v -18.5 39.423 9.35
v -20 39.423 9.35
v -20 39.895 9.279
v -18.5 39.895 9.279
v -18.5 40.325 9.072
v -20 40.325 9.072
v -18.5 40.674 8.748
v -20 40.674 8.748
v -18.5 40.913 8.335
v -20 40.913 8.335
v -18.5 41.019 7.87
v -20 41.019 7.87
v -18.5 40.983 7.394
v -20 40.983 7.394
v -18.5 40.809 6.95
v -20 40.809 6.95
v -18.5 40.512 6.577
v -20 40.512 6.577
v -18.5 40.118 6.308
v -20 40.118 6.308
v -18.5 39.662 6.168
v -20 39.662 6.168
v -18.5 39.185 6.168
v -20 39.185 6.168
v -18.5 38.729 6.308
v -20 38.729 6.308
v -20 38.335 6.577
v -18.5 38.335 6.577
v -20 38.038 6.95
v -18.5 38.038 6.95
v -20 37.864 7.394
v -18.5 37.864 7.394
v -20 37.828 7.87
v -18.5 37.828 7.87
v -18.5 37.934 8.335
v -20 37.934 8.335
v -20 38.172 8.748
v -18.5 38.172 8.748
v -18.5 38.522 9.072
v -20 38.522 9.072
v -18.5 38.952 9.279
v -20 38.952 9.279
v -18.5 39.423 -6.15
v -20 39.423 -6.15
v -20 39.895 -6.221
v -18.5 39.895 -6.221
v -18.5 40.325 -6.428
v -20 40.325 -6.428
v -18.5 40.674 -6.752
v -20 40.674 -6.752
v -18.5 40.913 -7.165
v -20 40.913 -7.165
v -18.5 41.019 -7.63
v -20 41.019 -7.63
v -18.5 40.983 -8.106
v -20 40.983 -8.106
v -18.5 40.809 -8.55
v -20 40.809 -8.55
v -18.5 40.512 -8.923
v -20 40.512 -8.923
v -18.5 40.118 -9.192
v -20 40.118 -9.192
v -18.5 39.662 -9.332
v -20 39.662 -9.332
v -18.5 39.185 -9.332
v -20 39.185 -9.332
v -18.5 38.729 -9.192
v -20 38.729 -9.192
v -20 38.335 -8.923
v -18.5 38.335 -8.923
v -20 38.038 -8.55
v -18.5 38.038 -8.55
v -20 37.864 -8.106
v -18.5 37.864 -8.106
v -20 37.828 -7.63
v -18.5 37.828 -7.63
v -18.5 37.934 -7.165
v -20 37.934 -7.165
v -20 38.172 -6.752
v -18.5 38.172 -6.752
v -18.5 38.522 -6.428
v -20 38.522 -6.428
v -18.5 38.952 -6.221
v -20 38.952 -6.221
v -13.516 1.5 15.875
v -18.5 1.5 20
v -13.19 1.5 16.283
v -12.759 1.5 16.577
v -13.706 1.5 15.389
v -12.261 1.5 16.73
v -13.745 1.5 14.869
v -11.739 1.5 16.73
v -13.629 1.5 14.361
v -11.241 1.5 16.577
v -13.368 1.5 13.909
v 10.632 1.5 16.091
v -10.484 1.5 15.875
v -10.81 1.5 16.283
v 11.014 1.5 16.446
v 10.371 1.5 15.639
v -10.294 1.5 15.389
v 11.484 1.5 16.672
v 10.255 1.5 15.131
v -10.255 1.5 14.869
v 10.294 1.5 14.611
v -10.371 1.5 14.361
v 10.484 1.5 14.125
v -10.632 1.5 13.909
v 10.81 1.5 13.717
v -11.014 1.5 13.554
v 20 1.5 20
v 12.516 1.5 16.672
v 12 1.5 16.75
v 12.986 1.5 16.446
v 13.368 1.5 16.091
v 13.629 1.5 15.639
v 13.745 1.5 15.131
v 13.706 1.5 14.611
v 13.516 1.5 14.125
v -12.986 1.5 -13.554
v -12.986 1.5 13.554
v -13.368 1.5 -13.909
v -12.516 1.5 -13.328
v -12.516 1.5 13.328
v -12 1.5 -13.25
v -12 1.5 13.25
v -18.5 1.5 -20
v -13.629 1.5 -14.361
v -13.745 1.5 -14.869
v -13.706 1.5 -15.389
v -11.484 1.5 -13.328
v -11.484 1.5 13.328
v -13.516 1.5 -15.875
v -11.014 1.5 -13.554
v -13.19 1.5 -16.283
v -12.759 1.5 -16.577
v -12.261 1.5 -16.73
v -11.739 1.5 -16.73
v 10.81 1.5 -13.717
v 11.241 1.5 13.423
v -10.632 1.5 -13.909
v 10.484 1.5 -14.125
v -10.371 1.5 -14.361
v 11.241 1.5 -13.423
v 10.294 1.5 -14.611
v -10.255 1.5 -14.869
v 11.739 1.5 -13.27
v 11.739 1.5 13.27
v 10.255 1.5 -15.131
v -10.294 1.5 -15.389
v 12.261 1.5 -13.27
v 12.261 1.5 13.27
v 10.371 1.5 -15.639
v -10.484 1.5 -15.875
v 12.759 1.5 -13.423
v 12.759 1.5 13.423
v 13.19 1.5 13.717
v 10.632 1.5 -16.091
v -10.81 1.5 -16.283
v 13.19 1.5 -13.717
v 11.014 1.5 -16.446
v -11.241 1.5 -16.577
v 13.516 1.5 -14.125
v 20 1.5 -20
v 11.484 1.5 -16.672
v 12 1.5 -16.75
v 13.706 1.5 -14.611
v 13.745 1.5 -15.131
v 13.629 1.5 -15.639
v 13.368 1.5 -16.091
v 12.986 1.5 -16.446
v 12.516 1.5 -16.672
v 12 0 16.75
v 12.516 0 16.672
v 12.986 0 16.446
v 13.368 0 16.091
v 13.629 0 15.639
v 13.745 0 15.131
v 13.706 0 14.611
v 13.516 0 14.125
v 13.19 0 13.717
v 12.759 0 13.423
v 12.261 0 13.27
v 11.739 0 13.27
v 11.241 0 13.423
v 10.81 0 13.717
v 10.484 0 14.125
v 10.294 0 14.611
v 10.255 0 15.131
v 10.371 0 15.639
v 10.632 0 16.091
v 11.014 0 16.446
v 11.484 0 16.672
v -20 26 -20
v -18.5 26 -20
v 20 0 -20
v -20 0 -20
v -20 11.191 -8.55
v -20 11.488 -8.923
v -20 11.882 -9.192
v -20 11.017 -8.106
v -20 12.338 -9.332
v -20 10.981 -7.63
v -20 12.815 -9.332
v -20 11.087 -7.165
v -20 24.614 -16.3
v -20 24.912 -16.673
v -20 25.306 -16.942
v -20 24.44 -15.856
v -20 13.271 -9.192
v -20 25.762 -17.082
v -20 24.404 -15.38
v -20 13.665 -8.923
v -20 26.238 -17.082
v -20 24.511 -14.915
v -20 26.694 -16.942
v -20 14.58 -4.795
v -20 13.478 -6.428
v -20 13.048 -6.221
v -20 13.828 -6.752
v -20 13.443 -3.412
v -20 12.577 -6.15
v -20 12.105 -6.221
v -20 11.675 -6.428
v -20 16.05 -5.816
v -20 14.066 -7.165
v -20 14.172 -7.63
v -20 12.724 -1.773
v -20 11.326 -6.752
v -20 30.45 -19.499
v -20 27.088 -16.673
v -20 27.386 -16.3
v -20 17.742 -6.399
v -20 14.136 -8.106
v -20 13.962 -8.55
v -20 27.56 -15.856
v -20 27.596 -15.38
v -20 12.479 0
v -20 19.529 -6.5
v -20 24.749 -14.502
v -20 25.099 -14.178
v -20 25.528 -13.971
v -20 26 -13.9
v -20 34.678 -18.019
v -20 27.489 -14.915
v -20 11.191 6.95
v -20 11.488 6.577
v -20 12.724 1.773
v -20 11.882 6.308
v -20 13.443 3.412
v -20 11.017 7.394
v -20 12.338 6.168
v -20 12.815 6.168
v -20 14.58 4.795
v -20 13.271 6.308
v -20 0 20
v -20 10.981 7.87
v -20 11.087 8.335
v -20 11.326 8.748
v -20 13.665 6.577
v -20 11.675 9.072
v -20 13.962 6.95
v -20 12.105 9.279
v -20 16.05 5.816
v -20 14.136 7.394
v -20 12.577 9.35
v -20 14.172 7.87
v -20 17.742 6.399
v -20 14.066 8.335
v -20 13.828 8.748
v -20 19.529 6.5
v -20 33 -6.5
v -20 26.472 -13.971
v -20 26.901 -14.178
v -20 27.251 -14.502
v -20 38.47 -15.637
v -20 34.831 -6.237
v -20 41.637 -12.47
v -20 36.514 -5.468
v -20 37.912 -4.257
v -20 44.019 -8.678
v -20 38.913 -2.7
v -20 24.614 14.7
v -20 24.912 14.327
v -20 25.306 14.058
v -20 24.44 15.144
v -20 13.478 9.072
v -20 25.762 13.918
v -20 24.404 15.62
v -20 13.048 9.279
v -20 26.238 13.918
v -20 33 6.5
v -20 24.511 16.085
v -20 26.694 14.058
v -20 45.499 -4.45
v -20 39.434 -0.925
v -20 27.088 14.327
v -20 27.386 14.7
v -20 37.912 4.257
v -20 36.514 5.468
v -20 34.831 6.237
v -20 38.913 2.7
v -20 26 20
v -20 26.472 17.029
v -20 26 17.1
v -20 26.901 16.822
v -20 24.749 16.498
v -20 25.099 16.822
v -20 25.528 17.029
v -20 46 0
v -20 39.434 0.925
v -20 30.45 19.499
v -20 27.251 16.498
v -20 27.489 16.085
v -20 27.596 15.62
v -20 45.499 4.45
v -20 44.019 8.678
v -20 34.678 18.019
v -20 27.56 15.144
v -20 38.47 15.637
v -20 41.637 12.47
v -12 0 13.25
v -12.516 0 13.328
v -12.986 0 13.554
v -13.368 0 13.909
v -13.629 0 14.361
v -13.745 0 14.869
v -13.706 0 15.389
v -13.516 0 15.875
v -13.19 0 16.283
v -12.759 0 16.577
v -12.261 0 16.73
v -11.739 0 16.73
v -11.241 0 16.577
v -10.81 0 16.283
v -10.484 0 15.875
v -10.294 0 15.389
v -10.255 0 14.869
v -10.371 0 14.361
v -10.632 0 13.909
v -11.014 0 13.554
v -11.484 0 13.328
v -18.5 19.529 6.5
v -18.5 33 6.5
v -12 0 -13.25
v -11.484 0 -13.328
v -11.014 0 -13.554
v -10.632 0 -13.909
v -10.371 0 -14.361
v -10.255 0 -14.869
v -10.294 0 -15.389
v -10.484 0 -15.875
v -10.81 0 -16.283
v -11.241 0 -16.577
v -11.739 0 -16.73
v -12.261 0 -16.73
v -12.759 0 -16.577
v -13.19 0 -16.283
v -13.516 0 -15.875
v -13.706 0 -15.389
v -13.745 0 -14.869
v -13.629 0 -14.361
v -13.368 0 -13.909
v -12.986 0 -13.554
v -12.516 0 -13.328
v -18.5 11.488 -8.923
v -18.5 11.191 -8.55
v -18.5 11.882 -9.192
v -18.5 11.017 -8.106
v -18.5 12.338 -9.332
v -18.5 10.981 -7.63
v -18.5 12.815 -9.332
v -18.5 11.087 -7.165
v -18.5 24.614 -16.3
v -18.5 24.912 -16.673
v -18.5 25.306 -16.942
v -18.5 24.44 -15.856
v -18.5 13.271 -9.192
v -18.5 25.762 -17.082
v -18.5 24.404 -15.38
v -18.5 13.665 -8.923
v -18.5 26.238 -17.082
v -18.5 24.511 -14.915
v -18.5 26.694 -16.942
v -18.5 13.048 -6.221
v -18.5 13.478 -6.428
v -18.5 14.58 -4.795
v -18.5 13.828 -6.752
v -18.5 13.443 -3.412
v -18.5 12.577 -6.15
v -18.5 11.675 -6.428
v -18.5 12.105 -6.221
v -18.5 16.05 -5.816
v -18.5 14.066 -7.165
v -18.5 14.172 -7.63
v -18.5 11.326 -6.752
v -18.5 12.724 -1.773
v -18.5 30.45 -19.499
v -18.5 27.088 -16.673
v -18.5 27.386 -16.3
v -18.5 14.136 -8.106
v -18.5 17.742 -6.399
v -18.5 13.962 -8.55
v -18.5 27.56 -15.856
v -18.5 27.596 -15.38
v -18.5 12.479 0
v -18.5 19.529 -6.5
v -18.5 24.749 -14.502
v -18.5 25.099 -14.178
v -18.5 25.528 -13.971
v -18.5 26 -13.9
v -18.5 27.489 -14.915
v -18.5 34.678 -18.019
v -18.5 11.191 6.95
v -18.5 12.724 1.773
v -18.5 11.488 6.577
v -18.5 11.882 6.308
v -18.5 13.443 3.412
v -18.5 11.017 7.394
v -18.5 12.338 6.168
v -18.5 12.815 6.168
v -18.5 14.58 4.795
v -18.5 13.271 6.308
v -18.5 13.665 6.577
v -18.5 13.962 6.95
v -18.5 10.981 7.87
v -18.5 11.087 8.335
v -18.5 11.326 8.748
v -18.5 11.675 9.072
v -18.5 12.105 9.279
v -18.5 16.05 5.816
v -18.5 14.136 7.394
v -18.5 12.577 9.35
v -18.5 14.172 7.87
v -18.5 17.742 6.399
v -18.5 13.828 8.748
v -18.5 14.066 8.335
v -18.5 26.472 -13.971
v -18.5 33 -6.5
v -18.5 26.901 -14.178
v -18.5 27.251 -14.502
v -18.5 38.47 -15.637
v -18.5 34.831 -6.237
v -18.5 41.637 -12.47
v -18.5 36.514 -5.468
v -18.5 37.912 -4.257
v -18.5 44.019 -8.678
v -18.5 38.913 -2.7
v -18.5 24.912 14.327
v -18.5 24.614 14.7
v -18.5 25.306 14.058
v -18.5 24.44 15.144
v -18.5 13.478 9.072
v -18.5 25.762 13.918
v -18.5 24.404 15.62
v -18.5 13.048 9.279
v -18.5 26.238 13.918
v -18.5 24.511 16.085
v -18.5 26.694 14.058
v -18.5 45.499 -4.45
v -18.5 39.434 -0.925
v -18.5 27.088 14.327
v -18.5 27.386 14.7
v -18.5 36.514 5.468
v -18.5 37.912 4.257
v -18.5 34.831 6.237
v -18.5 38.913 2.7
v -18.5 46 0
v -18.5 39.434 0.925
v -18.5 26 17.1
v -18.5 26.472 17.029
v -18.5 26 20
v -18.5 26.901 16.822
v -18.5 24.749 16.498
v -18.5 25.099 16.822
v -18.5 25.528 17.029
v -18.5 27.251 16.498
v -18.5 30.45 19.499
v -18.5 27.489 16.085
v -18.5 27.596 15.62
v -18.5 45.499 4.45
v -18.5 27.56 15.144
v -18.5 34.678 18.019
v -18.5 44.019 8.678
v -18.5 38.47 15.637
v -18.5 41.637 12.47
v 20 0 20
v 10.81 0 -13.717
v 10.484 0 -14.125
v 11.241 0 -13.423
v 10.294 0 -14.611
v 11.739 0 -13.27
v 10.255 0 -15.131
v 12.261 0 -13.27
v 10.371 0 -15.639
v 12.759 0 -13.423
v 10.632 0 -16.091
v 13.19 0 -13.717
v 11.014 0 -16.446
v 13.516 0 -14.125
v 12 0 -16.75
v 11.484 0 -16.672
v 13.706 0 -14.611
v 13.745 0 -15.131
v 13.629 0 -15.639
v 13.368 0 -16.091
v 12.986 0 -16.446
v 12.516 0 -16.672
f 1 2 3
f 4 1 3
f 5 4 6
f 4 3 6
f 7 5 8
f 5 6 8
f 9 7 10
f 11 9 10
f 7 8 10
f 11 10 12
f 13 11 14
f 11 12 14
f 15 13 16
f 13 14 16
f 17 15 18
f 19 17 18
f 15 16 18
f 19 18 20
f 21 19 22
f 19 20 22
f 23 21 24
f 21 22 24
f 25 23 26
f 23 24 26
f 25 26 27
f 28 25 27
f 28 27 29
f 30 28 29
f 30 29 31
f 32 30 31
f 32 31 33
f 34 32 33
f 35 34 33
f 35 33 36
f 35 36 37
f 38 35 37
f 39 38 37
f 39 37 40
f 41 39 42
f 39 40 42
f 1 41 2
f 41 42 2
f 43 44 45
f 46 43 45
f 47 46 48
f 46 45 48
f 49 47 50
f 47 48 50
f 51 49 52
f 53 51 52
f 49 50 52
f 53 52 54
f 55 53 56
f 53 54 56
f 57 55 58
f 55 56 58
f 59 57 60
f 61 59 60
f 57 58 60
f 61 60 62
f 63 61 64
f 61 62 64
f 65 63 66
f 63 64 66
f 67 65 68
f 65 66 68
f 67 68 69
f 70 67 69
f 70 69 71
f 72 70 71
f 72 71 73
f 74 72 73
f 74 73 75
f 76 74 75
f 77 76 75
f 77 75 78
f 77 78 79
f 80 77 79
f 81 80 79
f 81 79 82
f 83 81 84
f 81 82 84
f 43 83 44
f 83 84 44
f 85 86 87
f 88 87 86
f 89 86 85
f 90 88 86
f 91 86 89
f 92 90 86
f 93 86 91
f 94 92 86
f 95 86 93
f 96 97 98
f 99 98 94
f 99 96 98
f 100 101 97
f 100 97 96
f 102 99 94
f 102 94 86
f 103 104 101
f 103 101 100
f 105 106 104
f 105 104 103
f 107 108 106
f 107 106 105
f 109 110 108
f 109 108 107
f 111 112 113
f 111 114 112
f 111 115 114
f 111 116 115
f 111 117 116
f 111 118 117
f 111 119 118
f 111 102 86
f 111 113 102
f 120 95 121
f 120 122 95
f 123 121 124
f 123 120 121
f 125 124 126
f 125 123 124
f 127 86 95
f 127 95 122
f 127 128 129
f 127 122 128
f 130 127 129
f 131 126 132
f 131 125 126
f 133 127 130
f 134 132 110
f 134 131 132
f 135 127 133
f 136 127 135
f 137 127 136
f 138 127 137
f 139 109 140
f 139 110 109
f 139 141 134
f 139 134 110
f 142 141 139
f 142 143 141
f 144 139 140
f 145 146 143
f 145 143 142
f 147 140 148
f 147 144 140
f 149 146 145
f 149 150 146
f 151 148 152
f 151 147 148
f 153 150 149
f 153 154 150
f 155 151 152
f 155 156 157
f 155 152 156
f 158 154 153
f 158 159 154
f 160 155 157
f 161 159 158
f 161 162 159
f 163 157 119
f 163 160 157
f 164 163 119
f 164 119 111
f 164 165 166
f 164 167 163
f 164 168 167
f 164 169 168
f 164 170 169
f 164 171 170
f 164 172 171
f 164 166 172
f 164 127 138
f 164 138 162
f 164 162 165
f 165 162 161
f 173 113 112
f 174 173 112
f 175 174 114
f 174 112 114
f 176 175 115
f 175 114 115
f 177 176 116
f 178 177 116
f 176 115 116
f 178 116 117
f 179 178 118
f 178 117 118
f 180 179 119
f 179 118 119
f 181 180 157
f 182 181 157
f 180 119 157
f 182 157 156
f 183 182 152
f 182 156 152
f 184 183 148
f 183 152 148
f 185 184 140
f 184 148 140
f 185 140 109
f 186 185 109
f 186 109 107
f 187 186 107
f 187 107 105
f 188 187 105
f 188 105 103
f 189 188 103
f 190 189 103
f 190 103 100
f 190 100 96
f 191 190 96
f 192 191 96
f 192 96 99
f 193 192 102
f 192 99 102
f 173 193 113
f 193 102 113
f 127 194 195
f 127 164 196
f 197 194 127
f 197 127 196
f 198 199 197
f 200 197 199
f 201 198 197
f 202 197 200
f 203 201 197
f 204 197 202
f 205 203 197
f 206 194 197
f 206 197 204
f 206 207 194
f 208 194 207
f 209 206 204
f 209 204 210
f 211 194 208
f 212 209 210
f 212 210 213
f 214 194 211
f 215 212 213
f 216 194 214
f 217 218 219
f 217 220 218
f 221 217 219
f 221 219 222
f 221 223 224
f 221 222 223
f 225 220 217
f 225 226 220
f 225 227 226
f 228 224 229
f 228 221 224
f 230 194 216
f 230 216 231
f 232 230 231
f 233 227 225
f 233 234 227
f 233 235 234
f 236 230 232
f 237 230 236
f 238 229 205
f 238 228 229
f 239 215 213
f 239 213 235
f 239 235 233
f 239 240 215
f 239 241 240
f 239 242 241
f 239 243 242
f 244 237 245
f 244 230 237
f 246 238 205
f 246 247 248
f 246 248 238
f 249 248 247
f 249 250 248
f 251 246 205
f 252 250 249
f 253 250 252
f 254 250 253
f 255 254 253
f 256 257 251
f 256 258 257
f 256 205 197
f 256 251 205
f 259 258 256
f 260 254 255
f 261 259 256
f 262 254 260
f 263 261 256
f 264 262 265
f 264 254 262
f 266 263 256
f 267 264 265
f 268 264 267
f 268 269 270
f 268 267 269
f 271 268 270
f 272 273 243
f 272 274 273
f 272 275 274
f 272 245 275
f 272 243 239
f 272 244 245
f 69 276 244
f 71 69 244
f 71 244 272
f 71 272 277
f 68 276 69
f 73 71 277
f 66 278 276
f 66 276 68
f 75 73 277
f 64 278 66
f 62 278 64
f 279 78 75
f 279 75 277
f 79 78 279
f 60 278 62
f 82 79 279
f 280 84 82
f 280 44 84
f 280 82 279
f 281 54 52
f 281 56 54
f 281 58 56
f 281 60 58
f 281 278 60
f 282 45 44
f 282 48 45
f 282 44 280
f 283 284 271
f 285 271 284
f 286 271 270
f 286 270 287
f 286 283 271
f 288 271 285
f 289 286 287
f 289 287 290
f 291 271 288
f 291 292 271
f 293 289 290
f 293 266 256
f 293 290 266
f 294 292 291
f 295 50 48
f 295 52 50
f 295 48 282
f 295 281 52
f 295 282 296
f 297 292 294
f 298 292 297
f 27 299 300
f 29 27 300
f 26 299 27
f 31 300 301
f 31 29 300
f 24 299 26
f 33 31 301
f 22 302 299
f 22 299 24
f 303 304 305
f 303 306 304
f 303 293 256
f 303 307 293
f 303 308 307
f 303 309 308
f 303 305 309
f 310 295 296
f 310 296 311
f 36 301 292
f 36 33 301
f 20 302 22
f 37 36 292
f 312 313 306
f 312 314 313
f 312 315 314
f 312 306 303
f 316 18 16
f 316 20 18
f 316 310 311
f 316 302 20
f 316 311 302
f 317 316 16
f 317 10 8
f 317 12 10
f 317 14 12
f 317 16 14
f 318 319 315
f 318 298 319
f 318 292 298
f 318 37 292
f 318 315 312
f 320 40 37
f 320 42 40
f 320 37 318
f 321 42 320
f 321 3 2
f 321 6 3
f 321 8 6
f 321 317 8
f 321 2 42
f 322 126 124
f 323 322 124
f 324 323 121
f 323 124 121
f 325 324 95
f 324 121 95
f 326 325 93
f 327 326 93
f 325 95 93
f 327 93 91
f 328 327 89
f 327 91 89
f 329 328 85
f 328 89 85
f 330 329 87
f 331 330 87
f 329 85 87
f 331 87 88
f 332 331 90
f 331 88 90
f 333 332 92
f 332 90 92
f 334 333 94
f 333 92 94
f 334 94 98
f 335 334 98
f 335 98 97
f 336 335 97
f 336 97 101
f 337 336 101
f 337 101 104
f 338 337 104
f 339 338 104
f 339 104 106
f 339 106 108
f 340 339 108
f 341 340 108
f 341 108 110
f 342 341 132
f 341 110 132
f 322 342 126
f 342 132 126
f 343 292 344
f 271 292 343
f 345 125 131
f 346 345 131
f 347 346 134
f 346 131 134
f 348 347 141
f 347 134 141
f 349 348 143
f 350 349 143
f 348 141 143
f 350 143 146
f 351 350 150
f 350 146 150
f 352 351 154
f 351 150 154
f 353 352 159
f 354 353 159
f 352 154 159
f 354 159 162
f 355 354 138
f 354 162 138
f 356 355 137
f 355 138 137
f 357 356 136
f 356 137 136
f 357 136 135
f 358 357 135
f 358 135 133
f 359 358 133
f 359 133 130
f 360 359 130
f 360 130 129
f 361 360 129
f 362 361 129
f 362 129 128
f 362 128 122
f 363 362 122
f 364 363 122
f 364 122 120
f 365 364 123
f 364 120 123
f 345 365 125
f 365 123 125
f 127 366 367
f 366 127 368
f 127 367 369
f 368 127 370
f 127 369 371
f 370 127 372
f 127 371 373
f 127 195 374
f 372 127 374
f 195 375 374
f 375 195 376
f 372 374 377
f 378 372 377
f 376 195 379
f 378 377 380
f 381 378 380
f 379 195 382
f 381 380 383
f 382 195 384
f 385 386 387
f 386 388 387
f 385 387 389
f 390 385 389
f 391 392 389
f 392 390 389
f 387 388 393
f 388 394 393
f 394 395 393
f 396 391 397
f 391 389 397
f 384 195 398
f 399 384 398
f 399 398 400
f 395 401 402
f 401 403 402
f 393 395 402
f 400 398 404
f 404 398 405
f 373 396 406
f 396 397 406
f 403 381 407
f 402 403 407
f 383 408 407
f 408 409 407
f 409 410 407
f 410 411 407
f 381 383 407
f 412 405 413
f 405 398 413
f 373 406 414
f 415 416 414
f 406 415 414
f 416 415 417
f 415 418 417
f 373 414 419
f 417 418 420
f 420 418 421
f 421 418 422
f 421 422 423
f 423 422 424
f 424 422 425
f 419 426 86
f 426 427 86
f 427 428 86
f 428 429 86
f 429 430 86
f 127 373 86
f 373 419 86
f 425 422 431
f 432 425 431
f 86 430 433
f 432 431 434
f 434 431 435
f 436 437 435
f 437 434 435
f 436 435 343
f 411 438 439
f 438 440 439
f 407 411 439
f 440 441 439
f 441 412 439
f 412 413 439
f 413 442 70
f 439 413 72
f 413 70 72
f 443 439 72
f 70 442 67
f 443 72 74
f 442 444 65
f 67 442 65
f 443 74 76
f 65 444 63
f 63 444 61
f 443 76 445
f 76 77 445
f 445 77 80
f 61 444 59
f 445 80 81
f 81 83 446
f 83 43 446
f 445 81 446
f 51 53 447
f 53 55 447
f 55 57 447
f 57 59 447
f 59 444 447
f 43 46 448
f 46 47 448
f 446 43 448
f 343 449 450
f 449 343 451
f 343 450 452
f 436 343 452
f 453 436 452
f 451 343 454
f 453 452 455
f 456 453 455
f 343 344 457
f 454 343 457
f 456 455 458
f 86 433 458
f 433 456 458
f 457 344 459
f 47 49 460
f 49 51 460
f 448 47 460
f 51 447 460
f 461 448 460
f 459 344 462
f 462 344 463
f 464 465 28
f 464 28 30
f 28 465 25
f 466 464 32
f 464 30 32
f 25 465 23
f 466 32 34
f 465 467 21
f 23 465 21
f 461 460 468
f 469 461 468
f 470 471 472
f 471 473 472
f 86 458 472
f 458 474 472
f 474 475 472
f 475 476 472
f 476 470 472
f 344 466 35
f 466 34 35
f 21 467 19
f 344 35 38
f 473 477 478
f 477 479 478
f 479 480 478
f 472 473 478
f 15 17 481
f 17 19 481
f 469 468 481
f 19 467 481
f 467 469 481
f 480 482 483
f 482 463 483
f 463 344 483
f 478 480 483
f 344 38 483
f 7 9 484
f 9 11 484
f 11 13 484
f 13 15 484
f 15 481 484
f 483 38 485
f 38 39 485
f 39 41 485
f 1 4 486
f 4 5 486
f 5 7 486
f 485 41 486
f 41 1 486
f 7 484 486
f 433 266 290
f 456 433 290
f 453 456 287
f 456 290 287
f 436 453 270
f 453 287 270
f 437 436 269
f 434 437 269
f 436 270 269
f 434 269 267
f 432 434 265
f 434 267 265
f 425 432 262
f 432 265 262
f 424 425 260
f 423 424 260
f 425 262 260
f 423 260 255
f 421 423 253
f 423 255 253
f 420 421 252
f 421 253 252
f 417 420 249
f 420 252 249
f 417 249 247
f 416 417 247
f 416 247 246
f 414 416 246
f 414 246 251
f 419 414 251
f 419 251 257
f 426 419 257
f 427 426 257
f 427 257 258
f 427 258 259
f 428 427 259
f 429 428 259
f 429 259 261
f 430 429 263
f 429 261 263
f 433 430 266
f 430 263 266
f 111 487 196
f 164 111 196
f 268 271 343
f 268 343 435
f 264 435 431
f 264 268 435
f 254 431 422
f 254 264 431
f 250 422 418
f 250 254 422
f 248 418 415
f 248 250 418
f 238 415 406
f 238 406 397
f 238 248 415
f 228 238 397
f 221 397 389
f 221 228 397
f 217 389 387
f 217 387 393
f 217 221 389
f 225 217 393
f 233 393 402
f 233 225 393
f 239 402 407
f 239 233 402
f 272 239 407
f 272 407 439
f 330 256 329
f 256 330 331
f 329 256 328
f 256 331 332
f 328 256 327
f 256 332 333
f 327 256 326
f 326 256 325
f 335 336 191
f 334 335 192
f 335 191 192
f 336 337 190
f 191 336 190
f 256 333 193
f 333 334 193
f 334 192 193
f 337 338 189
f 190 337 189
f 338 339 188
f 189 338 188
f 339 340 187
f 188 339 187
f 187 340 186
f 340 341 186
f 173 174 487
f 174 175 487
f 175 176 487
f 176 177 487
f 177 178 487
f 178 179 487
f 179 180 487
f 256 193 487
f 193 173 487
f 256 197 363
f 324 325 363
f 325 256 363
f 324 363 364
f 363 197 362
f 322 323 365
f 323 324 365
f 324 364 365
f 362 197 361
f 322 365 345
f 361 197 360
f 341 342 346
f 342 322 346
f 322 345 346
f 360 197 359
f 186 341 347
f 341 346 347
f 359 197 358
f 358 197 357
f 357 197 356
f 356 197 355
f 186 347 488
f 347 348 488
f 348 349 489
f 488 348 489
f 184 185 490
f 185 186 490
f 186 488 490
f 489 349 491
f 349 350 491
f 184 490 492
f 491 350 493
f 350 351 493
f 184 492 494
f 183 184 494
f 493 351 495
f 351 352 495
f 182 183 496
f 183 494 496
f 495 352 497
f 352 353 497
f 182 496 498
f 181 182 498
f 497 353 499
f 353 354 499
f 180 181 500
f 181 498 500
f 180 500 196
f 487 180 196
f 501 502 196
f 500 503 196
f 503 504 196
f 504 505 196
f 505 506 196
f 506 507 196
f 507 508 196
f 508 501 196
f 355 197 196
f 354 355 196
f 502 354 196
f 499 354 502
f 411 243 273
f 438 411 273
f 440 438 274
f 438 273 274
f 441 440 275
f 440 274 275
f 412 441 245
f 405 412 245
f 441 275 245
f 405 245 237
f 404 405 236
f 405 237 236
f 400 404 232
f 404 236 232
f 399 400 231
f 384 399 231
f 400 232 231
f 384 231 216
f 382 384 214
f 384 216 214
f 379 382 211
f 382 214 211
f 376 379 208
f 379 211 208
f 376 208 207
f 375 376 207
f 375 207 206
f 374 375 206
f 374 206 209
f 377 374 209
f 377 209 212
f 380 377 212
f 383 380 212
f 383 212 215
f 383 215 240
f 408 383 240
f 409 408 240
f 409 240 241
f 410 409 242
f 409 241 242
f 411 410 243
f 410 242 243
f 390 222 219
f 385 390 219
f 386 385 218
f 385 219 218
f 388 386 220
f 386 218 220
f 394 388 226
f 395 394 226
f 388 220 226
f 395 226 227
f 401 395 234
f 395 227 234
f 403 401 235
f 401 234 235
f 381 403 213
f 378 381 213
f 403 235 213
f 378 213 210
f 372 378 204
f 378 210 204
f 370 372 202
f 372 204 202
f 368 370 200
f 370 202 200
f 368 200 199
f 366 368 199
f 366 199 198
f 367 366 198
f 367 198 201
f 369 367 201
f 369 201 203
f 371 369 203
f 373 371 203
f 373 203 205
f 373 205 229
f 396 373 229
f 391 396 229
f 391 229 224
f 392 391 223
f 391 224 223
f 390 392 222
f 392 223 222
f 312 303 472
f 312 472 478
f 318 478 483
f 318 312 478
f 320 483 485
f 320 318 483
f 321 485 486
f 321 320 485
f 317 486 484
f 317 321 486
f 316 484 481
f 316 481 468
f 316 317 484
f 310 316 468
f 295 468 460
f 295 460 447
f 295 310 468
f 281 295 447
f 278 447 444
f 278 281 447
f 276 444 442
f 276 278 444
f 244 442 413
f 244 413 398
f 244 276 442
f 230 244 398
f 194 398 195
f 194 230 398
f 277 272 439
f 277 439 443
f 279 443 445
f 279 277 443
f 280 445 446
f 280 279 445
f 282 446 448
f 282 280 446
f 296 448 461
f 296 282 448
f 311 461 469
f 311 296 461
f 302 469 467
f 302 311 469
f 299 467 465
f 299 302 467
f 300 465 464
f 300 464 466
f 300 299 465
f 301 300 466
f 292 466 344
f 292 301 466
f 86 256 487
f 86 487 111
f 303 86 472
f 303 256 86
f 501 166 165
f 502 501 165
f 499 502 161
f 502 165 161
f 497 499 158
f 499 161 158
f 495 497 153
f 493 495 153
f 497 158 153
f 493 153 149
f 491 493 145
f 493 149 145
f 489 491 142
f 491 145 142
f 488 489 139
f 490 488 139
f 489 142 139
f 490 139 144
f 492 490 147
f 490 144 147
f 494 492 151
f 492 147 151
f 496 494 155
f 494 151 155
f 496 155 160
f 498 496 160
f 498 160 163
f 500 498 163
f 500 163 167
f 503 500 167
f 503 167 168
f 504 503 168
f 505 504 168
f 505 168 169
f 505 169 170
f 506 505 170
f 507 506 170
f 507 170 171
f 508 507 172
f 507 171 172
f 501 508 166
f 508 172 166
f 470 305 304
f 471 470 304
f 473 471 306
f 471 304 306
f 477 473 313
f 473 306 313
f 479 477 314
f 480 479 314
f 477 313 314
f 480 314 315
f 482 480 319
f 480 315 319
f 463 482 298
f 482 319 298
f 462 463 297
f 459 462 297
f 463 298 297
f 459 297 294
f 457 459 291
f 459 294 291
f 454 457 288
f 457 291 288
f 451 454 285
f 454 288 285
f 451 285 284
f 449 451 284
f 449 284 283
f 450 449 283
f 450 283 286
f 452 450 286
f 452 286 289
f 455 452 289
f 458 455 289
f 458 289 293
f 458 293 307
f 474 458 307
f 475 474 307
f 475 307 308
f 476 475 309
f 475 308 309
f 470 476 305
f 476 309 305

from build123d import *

# Parameters (mm, degrees)
SKETCH_1_W          = 40
SKETCH_1_H          = 40
EXTRUDE_1_DEPTH     = 1.5
SKETCH_4_R          = 1.6
EXTRUDE_2_DEPTH     = 1.5
SKETCH_5_R          = 1.75
CUT_EXTRUDE_1_DEPTH = 1.5


with BuildPart() as part:
    # 草图1 → 凸台-拉伸1 (new body)
    with BuildSketch(Plane(origin=(0, 0, 0), x_dir=(1, 0, 0), z_dir=(0, 1, 0))):
        Rectangle(SKETCH_1_W, SKETCH_1_H)
    extrude(amount=EXTRUDE_1_DEPTH)

    # 草图4 → 凸台-拉伸2 (add)
    with BuildSketch(Plane.ZY.offset(20)):
        with BuildLine():
            Line((-20, 1.5), (20, 1.5))
            Line((20, 1.5), (20, 26))
            ThreePointArc((20, 26), (0, 46), (-20, 26))
            Line((-20, 26), (-20, 1.5))
        make_face()
        with Locations((-7.75, 12.576606241)):
            Circle(SKETCH_4_R, mode=Mode.SUBTRACT)
        with Locations((7.75, 12.576606241)):
            Circle(SKETCH_4_R, mode=Mode.SUBTRACT)
        with Locations((-15.5, 26)):
            Circle(SKETCH_4_R, mode=Mode.SUBTRACT)
        with Locations((-7.75, 39.423393759)):
            Circle(SKETCH_4_R, mode=Mode.SUBTRACT)
        with BuildLine():
            Line((-6.5, 19.528878463), (-6.5, 33))
            ThreePointArc((-6.5, 33), (0, 39.5), (6.5, 33))
            Line((6.5, 33), (6.5, 19.528878463))
            ThreePointArc((6.5, 19.528878463), (0, 12.478519154), (-6.5, 19.528878463))
        make_face(mode=Mode.SUBTRACT)
        with Locations((15.5, 26)):
            Circle(SKETCH_4_R, mode=Mode.SUBTRACT)
        with Locations((7.75, 39.423393759)):
            Circle(SKETCH_4_R, mode=Mode.SUBTRACT)
    extrude(amount=-EXTRUDE_2_DEPTH)

    # 草图5 → 切除-拉伸1 (cut)
    with BuildSketch(Plane(origin=(0, 1.5, 0), x_dir=(1, 0, 0), z_dir=(0, 1, 0))):
        with Locations(Location((12, -15, 0), (0, 0, 270))):
            Circle(SKETCH_5_R)
        with Locations(Location((12, 15, 0), (0, 0, 90))):
            Circle(SKETCH_5_R)
        with Locations(Location((-12, -15, 0), (0, 0, 90))):
            Circle(SKETCH_5_R)
        with Locations(Location((-12, 15, 0), (0, 0, 270))):
            Circle(SKETCH_5_R)
    extrude(amount=-CUT_EXTRUDE_1_DEPTH, mode=Mode.SUBTRACT)


solid = part.part
